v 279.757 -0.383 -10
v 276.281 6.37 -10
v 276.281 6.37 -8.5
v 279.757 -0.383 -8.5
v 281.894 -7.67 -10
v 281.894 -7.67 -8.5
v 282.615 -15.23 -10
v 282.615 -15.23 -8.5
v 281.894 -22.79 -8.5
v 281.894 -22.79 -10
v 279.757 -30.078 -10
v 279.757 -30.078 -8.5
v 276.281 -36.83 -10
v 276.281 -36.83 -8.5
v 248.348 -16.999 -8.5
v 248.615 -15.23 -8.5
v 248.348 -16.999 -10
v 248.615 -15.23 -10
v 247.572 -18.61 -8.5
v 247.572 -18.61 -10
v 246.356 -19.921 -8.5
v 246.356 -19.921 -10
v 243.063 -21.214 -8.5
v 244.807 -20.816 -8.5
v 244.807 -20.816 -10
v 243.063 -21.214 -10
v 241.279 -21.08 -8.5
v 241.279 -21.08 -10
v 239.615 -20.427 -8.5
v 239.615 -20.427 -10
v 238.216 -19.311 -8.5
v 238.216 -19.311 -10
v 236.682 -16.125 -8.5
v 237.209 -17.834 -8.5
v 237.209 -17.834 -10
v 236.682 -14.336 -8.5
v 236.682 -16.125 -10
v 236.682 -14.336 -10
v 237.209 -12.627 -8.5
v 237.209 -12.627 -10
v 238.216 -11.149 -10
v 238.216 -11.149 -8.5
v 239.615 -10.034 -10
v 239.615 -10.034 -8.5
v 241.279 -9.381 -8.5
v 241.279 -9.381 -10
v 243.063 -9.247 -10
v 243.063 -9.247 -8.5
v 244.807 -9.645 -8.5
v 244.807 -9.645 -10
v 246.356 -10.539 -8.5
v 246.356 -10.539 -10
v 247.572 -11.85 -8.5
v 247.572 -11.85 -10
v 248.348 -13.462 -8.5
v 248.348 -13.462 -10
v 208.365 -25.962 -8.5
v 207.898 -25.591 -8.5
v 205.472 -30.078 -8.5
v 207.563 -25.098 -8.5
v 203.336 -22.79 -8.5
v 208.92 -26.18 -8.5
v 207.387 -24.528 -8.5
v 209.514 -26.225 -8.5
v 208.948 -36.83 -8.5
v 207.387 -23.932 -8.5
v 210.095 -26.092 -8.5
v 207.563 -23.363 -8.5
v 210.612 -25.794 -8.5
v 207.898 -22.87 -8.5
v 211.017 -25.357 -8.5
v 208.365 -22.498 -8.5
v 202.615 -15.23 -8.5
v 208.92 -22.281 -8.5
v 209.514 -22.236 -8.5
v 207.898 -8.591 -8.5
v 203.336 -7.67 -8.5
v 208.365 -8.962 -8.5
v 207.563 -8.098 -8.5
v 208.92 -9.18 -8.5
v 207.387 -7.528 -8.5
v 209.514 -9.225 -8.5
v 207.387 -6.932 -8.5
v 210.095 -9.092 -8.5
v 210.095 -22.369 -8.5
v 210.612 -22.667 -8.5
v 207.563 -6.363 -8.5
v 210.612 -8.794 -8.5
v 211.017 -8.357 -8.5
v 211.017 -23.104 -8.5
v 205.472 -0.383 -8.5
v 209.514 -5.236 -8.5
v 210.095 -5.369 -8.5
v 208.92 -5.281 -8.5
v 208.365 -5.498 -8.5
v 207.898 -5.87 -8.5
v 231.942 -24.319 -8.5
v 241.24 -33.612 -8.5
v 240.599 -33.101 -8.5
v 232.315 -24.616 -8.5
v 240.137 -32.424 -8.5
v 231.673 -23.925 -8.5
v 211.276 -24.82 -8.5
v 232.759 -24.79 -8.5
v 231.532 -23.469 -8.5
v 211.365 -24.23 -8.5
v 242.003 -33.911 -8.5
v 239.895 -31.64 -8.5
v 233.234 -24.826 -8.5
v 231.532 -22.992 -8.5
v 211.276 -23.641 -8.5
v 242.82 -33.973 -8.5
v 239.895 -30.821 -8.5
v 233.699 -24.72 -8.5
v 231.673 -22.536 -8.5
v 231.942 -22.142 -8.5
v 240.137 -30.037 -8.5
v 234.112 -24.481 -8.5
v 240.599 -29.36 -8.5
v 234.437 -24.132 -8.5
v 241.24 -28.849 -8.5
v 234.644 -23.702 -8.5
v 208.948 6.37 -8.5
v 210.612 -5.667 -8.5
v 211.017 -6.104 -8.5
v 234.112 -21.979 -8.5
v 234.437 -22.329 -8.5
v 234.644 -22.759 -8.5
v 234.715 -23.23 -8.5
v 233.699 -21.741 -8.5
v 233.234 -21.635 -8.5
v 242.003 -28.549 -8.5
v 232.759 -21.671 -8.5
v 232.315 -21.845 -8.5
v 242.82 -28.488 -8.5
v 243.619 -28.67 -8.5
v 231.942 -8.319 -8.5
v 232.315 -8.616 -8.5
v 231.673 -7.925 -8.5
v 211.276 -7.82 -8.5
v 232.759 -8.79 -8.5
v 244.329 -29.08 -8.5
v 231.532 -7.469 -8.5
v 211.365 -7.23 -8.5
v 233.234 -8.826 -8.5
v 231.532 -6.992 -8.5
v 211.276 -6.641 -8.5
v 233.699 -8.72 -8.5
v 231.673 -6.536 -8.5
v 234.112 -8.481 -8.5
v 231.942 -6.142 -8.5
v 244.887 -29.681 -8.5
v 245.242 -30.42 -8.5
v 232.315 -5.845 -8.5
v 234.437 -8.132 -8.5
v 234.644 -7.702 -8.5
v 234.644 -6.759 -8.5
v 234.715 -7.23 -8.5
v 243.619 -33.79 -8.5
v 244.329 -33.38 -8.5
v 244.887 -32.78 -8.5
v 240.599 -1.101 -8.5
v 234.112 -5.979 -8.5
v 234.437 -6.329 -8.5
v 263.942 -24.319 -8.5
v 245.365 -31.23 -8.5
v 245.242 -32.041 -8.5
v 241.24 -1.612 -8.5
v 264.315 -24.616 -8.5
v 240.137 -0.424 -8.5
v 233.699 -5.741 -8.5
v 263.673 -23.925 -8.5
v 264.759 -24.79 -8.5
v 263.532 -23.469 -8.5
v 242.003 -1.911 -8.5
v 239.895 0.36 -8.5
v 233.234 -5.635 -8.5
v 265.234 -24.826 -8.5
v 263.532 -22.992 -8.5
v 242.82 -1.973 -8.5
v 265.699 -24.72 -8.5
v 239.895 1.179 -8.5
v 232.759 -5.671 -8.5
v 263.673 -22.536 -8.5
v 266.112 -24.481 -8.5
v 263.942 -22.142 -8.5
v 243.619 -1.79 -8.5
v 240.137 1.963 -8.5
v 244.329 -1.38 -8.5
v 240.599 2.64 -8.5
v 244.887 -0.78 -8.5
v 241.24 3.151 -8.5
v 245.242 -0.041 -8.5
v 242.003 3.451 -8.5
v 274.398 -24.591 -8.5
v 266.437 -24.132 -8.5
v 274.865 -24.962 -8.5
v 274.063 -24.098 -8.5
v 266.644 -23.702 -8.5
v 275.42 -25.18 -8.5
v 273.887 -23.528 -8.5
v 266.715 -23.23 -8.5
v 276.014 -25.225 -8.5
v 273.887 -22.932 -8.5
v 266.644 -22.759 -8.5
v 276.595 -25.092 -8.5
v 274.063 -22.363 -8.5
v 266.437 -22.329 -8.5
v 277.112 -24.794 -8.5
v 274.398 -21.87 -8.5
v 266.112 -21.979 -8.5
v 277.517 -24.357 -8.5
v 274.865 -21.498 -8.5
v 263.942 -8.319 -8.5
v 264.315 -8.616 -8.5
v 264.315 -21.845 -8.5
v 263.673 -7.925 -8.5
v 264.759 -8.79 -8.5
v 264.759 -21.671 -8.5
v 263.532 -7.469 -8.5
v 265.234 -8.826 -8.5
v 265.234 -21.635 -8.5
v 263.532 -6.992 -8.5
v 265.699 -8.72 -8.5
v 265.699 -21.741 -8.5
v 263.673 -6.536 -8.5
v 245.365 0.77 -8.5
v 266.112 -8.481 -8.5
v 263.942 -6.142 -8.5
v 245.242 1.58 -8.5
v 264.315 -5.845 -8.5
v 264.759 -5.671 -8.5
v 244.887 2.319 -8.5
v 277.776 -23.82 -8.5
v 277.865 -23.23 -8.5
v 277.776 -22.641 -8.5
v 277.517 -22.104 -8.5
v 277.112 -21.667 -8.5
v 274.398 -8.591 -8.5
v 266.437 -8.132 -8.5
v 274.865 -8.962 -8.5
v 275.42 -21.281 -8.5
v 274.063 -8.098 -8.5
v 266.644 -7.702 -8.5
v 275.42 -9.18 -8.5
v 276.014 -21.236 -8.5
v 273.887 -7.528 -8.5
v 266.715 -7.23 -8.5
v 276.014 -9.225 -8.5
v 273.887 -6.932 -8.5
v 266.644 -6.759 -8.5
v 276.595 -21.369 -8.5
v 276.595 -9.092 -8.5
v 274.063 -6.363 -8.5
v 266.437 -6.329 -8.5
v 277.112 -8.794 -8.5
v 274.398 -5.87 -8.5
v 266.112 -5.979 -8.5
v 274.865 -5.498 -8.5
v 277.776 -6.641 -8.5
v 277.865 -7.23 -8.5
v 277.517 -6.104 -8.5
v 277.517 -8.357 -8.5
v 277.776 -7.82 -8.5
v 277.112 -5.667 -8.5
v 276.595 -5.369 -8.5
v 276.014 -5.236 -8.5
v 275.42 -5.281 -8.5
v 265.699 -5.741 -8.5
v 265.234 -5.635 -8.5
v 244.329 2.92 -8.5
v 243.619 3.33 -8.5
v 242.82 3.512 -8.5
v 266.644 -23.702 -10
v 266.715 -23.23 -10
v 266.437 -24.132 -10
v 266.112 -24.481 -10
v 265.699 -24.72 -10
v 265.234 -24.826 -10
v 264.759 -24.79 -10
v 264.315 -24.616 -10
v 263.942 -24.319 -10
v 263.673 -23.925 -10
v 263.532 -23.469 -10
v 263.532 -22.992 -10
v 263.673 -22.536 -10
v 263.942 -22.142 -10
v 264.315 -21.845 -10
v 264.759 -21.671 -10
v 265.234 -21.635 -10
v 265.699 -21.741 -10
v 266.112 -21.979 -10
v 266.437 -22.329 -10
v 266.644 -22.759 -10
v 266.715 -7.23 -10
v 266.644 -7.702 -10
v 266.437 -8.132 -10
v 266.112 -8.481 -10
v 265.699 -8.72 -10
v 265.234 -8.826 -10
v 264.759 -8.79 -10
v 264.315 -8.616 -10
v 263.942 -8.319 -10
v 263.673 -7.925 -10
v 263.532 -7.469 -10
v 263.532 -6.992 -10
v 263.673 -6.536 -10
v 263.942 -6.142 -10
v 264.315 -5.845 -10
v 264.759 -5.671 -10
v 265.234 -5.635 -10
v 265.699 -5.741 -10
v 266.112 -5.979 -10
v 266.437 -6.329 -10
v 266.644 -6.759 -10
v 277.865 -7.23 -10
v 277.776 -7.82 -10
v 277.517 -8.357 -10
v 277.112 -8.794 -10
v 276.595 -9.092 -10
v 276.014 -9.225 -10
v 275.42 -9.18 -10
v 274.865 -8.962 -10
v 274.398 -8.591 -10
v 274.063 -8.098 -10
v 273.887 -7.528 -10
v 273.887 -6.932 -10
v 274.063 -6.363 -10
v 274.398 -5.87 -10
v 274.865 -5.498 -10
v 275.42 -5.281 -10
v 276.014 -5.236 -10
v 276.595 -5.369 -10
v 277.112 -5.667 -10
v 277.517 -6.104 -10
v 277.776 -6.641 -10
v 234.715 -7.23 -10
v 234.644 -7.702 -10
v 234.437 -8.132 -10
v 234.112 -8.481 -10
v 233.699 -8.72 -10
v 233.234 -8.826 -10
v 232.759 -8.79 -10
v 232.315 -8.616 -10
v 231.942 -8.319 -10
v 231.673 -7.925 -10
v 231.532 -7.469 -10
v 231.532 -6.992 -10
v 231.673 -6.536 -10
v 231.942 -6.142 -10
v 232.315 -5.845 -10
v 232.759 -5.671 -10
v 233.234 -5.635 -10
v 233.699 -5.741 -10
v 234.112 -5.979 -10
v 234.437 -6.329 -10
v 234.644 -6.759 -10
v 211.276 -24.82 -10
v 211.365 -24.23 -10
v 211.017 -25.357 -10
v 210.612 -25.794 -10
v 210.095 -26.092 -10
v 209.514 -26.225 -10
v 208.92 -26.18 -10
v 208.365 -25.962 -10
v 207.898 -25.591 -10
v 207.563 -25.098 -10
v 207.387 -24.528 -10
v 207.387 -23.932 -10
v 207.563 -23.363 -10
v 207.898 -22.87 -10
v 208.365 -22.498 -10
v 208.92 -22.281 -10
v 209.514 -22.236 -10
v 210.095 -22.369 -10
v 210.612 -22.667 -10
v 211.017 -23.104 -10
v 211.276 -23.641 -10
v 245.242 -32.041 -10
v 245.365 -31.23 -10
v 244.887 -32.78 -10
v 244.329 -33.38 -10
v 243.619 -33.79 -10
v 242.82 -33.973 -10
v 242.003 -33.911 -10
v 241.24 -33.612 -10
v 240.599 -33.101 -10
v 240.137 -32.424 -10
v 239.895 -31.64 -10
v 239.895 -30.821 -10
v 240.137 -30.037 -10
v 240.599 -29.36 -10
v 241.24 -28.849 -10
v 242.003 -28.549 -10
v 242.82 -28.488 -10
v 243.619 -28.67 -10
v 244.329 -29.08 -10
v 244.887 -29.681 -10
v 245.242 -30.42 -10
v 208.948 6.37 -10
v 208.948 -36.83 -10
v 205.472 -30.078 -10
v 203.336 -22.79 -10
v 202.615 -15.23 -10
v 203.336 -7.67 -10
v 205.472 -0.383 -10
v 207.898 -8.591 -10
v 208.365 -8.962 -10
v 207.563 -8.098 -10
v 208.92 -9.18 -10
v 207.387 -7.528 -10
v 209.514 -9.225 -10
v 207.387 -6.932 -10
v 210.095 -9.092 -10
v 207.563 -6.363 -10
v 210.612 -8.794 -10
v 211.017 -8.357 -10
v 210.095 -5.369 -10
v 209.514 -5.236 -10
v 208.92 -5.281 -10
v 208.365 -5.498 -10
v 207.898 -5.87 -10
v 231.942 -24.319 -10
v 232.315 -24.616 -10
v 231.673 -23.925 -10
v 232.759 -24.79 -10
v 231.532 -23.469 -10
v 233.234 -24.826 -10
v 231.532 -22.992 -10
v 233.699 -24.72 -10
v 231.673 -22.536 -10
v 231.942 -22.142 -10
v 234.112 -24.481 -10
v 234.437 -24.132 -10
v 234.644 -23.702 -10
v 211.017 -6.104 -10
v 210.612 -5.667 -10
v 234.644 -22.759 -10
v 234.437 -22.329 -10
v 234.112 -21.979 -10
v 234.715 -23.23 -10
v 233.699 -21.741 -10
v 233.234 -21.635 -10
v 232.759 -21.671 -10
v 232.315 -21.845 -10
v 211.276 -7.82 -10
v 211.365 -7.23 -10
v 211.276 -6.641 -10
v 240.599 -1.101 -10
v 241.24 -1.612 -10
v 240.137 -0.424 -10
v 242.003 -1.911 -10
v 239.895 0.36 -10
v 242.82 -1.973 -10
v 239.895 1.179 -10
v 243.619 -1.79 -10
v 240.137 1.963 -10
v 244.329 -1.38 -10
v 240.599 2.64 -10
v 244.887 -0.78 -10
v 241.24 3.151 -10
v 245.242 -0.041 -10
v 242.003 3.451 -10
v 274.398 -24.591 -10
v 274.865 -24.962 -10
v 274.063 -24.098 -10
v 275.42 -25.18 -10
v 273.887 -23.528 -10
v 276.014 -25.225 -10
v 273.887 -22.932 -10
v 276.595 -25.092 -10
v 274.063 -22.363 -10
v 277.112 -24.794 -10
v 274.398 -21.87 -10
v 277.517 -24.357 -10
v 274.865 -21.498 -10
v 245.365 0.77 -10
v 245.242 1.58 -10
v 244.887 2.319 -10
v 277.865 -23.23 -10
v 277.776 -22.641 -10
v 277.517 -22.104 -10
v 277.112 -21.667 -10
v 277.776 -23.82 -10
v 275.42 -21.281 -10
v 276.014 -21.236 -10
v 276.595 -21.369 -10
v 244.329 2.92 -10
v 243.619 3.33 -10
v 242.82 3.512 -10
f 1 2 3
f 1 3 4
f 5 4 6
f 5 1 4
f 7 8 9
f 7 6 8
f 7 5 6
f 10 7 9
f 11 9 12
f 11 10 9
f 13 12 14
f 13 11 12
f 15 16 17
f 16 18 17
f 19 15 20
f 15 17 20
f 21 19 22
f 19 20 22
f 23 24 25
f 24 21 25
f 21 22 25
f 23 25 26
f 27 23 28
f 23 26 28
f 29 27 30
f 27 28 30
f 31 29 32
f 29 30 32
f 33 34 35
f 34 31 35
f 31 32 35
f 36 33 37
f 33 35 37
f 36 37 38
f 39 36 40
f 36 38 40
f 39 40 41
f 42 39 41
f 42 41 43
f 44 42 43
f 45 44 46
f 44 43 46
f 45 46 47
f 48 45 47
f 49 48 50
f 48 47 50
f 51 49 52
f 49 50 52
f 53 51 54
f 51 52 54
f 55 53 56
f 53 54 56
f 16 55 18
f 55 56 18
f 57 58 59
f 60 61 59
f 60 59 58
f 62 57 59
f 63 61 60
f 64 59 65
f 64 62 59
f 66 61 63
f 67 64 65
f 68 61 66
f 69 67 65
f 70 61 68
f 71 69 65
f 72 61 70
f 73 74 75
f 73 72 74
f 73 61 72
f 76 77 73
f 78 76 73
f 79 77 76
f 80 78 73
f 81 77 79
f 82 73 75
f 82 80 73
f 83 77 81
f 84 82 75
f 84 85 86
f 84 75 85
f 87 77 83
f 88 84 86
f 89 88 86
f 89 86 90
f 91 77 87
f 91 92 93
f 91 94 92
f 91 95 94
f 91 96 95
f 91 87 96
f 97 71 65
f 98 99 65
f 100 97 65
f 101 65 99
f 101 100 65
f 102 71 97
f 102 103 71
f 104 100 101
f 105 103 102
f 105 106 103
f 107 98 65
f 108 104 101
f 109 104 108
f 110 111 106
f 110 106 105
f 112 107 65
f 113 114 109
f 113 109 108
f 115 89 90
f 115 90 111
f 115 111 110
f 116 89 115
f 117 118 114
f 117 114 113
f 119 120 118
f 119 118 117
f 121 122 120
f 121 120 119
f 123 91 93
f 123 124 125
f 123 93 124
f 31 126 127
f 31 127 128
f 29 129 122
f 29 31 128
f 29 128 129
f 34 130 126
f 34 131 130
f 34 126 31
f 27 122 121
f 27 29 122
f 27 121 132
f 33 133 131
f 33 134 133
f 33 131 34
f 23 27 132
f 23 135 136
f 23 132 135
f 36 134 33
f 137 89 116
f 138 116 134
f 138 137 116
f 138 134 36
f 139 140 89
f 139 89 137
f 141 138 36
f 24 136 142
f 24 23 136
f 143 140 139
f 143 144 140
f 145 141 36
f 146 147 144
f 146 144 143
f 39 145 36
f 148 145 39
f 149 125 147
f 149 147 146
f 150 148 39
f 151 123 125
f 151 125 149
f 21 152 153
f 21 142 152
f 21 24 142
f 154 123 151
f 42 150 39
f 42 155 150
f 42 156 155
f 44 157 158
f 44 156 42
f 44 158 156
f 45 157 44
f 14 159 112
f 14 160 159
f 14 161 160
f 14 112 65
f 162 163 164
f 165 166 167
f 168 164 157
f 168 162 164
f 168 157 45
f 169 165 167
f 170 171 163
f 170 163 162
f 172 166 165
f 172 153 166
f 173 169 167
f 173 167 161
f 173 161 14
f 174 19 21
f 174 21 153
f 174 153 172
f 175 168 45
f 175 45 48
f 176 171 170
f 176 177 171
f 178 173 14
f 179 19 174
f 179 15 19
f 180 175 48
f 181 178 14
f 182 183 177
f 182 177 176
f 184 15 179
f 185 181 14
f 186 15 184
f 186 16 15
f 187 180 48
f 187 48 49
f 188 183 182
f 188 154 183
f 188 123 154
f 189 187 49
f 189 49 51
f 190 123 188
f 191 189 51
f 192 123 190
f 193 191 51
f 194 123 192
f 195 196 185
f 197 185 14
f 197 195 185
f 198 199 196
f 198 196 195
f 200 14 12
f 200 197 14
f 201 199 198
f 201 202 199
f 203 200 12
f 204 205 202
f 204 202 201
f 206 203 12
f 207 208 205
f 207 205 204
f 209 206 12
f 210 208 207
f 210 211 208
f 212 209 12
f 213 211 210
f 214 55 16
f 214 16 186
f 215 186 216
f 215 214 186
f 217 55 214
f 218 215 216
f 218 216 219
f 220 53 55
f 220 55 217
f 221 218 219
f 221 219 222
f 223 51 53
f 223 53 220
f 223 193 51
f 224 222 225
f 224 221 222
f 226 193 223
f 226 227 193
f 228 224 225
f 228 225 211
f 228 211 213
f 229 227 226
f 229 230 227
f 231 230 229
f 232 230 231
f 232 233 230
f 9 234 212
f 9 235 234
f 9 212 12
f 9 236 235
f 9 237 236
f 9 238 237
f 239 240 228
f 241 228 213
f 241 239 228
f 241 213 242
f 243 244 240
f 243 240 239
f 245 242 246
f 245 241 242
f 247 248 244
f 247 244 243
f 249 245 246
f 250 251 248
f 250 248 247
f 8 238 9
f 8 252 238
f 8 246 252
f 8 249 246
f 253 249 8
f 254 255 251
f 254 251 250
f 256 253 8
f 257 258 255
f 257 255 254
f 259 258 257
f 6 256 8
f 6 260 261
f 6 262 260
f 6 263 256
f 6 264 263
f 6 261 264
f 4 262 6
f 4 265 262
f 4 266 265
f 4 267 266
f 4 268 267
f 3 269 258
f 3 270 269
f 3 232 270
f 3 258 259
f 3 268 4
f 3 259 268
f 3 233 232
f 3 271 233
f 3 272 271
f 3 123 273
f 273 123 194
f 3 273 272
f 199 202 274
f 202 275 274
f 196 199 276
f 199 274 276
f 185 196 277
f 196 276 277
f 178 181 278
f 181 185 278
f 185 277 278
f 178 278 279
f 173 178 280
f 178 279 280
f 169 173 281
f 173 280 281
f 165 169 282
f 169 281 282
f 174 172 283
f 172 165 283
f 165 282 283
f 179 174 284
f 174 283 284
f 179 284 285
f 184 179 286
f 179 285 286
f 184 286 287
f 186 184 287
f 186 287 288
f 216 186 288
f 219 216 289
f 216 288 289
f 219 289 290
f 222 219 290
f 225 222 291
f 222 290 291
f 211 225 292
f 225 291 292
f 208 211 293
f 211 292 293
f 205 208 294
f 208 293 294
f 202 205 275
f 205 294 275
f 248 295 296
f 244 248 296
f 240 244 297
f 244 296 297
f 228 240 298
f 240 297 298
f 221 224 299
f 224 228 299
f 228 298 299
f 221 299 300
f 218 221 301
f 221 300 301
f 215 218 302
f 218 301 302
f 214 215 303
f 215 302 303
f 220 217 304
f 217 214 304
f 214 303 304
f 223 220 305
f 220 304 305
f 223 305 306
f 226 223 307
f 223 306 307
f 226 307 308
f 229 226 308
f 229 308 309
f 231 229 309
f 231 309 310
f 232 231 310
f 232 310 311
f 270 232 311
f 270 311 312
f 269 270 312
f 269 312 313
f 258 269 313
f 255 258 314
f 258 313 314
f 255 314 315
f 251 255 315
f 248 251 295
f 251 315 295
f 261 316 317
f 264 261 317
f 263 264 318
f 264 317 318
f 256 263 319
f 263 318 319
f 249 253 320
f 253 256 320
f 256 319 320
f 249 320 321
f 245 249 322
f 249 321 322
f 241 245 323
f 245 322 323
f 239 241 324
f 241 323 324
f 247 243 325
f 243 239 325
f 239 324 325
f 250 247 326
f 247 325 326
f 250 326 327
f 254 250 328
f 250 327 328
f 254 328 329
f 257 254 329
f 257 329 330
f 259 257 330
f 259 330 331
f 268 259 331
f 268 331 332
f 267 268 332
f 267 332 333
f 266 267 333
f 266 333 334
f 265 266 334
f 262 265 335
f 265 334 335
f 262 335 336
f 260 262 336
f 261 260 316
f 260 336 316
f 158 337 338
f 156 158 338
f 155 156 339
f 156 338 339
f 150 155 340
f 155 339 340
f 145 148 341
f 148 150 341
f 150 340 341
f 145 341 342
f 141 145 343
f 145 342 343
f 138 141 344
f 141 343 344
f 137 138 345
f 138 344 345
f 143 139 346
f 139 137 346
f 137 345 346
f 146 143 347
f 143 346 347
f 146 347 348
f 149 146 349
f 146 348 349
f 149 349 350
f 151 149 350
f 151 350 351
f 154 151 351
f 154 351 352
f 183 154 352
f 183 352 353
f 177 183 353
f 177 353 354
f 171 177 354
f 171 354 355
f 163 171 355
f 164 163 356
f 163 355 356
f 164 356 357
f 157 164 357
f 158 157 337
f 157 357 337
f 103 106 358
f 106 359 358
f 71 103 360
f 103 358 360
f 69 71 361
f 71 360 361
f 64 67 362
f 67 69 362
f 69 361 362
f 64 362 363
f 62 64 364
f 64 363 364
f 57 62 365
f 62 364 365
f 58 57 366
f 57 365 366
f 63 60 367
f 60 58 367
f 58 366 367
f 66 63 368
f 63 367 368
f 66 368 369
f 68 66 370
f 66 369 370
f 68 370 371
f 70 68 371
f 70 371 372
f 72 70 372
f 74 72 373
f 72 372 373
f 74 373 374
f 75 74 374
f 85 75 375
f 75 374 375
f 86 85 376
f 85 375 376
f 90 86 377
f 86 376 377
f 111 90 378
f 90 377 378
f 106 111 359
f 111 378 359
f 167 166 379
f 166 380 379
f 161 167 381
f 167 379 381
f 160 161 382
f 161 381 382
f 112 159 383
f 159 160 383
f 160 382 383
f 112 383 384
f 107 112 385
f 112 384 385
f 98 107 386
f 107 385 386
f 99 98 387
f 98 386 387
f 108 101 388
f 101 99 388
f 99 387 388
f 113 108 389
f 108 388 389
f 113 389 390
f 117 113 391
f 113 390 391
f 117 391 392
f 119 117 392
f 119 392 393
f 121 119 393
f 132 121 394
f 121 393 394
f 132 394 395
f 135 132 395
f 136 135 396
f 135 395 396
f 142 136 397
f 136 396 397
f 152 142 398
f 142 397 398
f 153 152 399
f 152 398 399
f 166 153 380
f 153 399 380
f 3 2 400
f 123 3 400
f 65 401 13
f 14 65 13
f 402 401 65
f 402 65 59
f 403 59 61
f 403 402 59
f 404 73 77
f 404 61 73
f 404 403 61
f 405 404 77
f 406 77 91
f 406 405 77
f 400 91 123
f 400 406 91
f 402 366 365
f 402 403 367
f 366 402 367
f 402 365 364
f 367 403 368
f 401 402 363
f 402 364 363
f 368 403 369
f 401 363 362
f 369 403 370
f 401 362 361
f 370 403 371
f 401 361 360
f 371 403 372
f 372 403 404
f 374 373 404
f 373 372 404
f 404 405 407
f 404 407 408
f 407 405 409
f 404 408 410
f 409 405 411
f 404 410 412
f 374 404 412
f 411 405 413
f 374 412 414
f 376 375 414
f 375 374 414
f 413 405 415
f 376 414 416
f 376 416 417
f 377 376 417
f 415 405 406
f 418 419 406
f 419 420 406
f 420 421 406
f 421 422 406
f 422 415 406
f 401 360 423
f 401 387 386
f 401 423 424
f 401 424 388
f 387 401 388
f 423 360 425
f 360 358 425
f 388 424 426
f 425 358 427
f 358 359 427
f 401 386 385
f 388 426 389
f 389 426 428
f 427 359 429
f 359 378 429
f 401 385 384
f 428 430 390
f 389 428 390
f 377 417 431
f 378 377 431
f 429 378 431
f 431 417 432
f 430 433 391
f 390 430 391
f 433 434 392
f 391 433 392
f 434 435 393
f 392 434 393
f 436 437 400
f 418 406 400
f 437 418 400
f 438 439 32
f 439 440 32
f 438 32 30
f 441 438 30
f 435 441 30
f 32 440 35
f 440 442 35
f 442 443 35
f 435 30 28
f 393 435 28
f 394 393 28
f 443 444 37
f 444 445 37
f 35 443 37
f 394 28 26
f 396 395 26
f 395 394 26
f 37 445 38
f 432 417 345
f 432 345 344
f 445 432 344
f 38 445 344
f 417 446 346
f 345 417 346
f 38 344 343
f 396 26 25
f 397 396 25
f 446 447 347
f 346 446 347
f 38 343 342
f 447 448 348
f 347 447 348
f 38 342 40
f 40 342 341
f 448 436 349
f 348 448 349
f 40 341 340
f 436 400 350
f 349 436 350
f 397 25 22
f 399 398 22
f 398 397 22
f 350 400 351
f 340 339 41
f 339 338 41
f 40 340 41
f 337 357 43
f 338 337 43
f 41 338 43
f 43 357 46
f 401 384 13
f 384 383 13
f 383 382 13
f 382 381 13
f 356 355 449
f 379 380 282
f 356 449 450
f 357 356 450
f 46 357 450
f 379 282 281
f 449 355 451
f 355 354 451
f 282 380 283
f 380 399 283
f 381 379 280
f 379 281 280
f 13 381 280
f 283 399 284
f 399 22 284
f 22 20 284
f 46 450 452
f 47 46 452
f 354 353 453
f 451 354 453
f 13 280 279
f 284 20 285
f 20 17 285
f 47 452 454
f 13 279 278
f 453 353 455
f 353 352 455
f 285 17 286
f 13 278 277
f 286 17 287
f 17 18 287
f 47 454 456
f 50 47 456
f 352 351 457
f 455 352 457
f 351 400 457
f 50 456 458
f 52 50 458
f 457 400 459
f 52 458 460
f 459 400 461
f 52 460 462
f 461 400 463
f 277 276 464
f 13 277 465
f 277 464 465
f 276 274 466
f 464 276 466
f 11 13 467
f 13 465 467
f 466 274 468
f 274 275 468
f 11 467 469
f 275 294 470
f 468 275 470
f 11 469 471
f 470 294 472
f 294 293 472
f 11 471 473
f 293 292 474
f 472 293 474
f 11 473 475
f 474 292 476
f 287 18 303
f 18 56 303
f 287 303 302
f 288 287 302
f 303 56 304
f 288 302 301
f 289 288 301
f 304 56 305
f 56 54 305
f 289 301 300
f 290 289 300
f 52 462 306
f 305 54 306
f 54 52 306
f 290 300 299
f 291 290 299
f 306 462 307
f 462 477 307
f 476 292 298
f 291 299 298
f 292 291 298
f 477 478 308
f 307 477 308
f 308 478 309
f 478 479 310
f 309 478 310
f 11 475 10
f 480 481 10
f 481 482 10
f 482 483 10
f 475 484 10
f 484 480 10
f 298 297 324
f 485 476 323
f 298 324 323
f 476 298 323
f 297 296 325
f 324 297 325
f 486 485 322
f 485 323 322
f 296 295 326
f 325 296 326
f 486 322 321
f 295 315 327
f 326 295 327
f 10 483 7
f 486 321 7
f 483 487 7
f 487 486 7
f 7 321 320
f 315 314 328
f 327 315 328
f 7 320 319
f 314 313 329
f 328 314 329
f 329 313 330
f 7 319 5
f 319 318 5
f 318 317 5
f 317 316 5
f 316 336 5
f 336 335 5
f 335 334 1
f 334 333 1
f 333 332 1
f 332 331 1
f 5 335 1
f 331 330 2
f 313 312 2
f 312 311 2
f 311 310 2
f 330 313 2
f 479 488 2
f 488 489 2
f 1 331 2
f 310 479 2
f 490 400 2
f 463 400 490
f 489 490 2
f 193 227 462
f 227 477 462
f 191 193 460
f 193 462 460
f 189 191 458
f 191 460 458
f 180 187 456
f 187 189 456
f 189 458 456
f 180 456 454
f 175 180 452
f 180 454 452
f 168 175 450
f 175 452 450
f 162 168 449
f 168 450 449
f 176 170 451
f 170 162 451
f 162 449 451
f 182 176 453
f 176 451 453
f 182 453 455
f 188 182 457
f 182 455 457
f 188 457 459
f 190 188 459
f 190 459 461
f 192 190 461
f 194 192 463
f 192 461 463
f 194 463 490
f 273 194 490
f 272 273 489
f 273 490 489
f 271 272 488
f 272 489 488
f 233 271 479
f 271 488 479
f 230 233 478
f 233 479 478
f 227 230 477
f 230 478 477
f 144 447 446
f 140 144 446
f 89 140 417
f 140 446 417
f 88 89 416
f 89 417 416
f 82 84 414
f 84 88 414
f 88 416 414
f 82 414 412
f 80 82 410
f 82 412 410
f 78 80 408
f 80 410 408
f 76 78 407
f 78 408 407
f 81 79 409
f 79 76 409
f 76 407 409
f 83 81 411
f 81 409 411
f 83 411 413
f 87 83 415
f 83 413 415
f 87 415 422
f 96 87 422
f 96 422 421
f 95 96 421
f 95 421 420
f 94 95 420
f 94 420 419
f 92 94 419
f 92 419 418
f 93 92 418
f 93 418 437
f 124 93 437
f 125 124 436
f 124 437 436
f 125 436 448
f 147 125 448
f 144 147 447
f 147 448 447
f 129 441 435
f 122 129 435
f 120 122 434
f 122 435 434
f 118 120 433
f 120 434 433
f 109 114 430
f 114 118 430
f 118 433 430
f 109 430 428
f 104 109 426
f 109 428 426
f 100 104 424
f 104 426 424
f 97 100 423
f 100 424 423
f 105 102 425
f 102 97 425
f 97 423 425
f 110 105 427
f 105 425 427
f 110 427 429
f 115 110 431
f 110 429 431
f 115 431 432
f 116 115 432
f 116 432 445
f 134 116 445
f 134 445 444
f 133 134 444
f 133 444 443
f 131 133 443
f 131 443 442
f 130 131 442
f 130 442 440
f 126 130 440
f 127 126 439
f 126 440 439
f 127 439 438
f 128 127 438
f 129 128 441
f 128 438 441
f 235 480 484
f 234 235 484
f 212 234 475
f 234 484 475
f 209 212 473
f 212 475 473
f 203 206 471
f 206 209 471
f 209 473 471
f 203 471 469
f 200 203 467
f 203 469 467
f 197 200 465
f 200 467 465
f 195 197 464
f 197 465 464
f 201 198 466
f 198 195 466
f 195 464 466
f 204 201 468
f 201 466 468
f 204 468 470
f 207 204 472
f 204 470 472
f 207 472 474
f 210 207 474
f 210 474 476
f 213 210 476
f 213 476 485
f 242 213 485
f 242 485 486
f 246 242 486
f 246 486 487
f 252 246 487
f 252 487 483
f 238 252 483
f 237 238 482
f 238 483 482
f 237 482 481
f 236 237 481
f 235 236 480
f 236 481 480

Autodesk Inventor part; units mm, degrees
ref_plane "YZ Plane" through (0, 0, 0) normal (1, 0, 0) x (0, 1, 0)
ref_plane "XZ Plane" through (0, 0, 0) normal (0, 1, 0) x (-1, 0, 0)
ref_plane "XY Plane" through (0, 0, 0) normal (0, 0, 1) x (1, 0, 0)
sketch "スケッチ1" plane through (0, 0, 0) normal (0, 0, 1) x (1, 0, 0)
  point P0 (0, 0)
ref_plane "作業平面1" through (242.6146, -15.2304, -10) normal (0, 0, 1) x (1, 0, 0)
sketch "スケッチ2" plane through (242.6146, -15.2304, -10) normal (0, 0, 1) x (1, 0, 0)
  line L0 (-33.6666, -21.6) -> (33.6666, -21.6) projected
  arc A0 (33.6666, -21.6) -> (33.6666, 21.6) centre (0, 0) ccw projected
  line L1 (33.6666, 21.6) -> (-33.6666, 21.6) projected
  arc A1 (-33.6666, 21.6) -> (-33.6666, -21.6) centre (0, 0) ccw projected
  circle A2 centre (33.25, -8) radius 2 projected
  circle A3 centre (33.25, 8) radius 2 projected
  circle A4 centre (22.5, 8) radius 1.6 projected
  circle A5 centre (22.5, -8) radius 1.6 projected
  line L2 (-4.9746, -0.5032) -> (-4.9749, 0.5004) projected
  arc A6 (-4.9746, -0.5032) -> (-4.9749, 0.5004) centre (0, 0) ccw projected
  circle A7 centre (-33.25, 8) radius 2 projected
  circle A8 centre (-9.5, -8) radius 1.6 projected
  circle A9 centre (-9.5, 8) radius 1.6 projected
  circle A10 centre (-33.25, -9) radius 2 projected
  circle A11 centre (0, 0) radius 6
  circle A12 centre (0, 16) radius 2.75 projected
  circle A13 centre (0, -16) radius 2.75 projected
  point P0 (-242.6146, 15.2304)
  dimension "d0" = 12
extrude "押し出し1" add sketch "スケッチ2" along normal blind 1.5 contours A1 L1 A0 L0
